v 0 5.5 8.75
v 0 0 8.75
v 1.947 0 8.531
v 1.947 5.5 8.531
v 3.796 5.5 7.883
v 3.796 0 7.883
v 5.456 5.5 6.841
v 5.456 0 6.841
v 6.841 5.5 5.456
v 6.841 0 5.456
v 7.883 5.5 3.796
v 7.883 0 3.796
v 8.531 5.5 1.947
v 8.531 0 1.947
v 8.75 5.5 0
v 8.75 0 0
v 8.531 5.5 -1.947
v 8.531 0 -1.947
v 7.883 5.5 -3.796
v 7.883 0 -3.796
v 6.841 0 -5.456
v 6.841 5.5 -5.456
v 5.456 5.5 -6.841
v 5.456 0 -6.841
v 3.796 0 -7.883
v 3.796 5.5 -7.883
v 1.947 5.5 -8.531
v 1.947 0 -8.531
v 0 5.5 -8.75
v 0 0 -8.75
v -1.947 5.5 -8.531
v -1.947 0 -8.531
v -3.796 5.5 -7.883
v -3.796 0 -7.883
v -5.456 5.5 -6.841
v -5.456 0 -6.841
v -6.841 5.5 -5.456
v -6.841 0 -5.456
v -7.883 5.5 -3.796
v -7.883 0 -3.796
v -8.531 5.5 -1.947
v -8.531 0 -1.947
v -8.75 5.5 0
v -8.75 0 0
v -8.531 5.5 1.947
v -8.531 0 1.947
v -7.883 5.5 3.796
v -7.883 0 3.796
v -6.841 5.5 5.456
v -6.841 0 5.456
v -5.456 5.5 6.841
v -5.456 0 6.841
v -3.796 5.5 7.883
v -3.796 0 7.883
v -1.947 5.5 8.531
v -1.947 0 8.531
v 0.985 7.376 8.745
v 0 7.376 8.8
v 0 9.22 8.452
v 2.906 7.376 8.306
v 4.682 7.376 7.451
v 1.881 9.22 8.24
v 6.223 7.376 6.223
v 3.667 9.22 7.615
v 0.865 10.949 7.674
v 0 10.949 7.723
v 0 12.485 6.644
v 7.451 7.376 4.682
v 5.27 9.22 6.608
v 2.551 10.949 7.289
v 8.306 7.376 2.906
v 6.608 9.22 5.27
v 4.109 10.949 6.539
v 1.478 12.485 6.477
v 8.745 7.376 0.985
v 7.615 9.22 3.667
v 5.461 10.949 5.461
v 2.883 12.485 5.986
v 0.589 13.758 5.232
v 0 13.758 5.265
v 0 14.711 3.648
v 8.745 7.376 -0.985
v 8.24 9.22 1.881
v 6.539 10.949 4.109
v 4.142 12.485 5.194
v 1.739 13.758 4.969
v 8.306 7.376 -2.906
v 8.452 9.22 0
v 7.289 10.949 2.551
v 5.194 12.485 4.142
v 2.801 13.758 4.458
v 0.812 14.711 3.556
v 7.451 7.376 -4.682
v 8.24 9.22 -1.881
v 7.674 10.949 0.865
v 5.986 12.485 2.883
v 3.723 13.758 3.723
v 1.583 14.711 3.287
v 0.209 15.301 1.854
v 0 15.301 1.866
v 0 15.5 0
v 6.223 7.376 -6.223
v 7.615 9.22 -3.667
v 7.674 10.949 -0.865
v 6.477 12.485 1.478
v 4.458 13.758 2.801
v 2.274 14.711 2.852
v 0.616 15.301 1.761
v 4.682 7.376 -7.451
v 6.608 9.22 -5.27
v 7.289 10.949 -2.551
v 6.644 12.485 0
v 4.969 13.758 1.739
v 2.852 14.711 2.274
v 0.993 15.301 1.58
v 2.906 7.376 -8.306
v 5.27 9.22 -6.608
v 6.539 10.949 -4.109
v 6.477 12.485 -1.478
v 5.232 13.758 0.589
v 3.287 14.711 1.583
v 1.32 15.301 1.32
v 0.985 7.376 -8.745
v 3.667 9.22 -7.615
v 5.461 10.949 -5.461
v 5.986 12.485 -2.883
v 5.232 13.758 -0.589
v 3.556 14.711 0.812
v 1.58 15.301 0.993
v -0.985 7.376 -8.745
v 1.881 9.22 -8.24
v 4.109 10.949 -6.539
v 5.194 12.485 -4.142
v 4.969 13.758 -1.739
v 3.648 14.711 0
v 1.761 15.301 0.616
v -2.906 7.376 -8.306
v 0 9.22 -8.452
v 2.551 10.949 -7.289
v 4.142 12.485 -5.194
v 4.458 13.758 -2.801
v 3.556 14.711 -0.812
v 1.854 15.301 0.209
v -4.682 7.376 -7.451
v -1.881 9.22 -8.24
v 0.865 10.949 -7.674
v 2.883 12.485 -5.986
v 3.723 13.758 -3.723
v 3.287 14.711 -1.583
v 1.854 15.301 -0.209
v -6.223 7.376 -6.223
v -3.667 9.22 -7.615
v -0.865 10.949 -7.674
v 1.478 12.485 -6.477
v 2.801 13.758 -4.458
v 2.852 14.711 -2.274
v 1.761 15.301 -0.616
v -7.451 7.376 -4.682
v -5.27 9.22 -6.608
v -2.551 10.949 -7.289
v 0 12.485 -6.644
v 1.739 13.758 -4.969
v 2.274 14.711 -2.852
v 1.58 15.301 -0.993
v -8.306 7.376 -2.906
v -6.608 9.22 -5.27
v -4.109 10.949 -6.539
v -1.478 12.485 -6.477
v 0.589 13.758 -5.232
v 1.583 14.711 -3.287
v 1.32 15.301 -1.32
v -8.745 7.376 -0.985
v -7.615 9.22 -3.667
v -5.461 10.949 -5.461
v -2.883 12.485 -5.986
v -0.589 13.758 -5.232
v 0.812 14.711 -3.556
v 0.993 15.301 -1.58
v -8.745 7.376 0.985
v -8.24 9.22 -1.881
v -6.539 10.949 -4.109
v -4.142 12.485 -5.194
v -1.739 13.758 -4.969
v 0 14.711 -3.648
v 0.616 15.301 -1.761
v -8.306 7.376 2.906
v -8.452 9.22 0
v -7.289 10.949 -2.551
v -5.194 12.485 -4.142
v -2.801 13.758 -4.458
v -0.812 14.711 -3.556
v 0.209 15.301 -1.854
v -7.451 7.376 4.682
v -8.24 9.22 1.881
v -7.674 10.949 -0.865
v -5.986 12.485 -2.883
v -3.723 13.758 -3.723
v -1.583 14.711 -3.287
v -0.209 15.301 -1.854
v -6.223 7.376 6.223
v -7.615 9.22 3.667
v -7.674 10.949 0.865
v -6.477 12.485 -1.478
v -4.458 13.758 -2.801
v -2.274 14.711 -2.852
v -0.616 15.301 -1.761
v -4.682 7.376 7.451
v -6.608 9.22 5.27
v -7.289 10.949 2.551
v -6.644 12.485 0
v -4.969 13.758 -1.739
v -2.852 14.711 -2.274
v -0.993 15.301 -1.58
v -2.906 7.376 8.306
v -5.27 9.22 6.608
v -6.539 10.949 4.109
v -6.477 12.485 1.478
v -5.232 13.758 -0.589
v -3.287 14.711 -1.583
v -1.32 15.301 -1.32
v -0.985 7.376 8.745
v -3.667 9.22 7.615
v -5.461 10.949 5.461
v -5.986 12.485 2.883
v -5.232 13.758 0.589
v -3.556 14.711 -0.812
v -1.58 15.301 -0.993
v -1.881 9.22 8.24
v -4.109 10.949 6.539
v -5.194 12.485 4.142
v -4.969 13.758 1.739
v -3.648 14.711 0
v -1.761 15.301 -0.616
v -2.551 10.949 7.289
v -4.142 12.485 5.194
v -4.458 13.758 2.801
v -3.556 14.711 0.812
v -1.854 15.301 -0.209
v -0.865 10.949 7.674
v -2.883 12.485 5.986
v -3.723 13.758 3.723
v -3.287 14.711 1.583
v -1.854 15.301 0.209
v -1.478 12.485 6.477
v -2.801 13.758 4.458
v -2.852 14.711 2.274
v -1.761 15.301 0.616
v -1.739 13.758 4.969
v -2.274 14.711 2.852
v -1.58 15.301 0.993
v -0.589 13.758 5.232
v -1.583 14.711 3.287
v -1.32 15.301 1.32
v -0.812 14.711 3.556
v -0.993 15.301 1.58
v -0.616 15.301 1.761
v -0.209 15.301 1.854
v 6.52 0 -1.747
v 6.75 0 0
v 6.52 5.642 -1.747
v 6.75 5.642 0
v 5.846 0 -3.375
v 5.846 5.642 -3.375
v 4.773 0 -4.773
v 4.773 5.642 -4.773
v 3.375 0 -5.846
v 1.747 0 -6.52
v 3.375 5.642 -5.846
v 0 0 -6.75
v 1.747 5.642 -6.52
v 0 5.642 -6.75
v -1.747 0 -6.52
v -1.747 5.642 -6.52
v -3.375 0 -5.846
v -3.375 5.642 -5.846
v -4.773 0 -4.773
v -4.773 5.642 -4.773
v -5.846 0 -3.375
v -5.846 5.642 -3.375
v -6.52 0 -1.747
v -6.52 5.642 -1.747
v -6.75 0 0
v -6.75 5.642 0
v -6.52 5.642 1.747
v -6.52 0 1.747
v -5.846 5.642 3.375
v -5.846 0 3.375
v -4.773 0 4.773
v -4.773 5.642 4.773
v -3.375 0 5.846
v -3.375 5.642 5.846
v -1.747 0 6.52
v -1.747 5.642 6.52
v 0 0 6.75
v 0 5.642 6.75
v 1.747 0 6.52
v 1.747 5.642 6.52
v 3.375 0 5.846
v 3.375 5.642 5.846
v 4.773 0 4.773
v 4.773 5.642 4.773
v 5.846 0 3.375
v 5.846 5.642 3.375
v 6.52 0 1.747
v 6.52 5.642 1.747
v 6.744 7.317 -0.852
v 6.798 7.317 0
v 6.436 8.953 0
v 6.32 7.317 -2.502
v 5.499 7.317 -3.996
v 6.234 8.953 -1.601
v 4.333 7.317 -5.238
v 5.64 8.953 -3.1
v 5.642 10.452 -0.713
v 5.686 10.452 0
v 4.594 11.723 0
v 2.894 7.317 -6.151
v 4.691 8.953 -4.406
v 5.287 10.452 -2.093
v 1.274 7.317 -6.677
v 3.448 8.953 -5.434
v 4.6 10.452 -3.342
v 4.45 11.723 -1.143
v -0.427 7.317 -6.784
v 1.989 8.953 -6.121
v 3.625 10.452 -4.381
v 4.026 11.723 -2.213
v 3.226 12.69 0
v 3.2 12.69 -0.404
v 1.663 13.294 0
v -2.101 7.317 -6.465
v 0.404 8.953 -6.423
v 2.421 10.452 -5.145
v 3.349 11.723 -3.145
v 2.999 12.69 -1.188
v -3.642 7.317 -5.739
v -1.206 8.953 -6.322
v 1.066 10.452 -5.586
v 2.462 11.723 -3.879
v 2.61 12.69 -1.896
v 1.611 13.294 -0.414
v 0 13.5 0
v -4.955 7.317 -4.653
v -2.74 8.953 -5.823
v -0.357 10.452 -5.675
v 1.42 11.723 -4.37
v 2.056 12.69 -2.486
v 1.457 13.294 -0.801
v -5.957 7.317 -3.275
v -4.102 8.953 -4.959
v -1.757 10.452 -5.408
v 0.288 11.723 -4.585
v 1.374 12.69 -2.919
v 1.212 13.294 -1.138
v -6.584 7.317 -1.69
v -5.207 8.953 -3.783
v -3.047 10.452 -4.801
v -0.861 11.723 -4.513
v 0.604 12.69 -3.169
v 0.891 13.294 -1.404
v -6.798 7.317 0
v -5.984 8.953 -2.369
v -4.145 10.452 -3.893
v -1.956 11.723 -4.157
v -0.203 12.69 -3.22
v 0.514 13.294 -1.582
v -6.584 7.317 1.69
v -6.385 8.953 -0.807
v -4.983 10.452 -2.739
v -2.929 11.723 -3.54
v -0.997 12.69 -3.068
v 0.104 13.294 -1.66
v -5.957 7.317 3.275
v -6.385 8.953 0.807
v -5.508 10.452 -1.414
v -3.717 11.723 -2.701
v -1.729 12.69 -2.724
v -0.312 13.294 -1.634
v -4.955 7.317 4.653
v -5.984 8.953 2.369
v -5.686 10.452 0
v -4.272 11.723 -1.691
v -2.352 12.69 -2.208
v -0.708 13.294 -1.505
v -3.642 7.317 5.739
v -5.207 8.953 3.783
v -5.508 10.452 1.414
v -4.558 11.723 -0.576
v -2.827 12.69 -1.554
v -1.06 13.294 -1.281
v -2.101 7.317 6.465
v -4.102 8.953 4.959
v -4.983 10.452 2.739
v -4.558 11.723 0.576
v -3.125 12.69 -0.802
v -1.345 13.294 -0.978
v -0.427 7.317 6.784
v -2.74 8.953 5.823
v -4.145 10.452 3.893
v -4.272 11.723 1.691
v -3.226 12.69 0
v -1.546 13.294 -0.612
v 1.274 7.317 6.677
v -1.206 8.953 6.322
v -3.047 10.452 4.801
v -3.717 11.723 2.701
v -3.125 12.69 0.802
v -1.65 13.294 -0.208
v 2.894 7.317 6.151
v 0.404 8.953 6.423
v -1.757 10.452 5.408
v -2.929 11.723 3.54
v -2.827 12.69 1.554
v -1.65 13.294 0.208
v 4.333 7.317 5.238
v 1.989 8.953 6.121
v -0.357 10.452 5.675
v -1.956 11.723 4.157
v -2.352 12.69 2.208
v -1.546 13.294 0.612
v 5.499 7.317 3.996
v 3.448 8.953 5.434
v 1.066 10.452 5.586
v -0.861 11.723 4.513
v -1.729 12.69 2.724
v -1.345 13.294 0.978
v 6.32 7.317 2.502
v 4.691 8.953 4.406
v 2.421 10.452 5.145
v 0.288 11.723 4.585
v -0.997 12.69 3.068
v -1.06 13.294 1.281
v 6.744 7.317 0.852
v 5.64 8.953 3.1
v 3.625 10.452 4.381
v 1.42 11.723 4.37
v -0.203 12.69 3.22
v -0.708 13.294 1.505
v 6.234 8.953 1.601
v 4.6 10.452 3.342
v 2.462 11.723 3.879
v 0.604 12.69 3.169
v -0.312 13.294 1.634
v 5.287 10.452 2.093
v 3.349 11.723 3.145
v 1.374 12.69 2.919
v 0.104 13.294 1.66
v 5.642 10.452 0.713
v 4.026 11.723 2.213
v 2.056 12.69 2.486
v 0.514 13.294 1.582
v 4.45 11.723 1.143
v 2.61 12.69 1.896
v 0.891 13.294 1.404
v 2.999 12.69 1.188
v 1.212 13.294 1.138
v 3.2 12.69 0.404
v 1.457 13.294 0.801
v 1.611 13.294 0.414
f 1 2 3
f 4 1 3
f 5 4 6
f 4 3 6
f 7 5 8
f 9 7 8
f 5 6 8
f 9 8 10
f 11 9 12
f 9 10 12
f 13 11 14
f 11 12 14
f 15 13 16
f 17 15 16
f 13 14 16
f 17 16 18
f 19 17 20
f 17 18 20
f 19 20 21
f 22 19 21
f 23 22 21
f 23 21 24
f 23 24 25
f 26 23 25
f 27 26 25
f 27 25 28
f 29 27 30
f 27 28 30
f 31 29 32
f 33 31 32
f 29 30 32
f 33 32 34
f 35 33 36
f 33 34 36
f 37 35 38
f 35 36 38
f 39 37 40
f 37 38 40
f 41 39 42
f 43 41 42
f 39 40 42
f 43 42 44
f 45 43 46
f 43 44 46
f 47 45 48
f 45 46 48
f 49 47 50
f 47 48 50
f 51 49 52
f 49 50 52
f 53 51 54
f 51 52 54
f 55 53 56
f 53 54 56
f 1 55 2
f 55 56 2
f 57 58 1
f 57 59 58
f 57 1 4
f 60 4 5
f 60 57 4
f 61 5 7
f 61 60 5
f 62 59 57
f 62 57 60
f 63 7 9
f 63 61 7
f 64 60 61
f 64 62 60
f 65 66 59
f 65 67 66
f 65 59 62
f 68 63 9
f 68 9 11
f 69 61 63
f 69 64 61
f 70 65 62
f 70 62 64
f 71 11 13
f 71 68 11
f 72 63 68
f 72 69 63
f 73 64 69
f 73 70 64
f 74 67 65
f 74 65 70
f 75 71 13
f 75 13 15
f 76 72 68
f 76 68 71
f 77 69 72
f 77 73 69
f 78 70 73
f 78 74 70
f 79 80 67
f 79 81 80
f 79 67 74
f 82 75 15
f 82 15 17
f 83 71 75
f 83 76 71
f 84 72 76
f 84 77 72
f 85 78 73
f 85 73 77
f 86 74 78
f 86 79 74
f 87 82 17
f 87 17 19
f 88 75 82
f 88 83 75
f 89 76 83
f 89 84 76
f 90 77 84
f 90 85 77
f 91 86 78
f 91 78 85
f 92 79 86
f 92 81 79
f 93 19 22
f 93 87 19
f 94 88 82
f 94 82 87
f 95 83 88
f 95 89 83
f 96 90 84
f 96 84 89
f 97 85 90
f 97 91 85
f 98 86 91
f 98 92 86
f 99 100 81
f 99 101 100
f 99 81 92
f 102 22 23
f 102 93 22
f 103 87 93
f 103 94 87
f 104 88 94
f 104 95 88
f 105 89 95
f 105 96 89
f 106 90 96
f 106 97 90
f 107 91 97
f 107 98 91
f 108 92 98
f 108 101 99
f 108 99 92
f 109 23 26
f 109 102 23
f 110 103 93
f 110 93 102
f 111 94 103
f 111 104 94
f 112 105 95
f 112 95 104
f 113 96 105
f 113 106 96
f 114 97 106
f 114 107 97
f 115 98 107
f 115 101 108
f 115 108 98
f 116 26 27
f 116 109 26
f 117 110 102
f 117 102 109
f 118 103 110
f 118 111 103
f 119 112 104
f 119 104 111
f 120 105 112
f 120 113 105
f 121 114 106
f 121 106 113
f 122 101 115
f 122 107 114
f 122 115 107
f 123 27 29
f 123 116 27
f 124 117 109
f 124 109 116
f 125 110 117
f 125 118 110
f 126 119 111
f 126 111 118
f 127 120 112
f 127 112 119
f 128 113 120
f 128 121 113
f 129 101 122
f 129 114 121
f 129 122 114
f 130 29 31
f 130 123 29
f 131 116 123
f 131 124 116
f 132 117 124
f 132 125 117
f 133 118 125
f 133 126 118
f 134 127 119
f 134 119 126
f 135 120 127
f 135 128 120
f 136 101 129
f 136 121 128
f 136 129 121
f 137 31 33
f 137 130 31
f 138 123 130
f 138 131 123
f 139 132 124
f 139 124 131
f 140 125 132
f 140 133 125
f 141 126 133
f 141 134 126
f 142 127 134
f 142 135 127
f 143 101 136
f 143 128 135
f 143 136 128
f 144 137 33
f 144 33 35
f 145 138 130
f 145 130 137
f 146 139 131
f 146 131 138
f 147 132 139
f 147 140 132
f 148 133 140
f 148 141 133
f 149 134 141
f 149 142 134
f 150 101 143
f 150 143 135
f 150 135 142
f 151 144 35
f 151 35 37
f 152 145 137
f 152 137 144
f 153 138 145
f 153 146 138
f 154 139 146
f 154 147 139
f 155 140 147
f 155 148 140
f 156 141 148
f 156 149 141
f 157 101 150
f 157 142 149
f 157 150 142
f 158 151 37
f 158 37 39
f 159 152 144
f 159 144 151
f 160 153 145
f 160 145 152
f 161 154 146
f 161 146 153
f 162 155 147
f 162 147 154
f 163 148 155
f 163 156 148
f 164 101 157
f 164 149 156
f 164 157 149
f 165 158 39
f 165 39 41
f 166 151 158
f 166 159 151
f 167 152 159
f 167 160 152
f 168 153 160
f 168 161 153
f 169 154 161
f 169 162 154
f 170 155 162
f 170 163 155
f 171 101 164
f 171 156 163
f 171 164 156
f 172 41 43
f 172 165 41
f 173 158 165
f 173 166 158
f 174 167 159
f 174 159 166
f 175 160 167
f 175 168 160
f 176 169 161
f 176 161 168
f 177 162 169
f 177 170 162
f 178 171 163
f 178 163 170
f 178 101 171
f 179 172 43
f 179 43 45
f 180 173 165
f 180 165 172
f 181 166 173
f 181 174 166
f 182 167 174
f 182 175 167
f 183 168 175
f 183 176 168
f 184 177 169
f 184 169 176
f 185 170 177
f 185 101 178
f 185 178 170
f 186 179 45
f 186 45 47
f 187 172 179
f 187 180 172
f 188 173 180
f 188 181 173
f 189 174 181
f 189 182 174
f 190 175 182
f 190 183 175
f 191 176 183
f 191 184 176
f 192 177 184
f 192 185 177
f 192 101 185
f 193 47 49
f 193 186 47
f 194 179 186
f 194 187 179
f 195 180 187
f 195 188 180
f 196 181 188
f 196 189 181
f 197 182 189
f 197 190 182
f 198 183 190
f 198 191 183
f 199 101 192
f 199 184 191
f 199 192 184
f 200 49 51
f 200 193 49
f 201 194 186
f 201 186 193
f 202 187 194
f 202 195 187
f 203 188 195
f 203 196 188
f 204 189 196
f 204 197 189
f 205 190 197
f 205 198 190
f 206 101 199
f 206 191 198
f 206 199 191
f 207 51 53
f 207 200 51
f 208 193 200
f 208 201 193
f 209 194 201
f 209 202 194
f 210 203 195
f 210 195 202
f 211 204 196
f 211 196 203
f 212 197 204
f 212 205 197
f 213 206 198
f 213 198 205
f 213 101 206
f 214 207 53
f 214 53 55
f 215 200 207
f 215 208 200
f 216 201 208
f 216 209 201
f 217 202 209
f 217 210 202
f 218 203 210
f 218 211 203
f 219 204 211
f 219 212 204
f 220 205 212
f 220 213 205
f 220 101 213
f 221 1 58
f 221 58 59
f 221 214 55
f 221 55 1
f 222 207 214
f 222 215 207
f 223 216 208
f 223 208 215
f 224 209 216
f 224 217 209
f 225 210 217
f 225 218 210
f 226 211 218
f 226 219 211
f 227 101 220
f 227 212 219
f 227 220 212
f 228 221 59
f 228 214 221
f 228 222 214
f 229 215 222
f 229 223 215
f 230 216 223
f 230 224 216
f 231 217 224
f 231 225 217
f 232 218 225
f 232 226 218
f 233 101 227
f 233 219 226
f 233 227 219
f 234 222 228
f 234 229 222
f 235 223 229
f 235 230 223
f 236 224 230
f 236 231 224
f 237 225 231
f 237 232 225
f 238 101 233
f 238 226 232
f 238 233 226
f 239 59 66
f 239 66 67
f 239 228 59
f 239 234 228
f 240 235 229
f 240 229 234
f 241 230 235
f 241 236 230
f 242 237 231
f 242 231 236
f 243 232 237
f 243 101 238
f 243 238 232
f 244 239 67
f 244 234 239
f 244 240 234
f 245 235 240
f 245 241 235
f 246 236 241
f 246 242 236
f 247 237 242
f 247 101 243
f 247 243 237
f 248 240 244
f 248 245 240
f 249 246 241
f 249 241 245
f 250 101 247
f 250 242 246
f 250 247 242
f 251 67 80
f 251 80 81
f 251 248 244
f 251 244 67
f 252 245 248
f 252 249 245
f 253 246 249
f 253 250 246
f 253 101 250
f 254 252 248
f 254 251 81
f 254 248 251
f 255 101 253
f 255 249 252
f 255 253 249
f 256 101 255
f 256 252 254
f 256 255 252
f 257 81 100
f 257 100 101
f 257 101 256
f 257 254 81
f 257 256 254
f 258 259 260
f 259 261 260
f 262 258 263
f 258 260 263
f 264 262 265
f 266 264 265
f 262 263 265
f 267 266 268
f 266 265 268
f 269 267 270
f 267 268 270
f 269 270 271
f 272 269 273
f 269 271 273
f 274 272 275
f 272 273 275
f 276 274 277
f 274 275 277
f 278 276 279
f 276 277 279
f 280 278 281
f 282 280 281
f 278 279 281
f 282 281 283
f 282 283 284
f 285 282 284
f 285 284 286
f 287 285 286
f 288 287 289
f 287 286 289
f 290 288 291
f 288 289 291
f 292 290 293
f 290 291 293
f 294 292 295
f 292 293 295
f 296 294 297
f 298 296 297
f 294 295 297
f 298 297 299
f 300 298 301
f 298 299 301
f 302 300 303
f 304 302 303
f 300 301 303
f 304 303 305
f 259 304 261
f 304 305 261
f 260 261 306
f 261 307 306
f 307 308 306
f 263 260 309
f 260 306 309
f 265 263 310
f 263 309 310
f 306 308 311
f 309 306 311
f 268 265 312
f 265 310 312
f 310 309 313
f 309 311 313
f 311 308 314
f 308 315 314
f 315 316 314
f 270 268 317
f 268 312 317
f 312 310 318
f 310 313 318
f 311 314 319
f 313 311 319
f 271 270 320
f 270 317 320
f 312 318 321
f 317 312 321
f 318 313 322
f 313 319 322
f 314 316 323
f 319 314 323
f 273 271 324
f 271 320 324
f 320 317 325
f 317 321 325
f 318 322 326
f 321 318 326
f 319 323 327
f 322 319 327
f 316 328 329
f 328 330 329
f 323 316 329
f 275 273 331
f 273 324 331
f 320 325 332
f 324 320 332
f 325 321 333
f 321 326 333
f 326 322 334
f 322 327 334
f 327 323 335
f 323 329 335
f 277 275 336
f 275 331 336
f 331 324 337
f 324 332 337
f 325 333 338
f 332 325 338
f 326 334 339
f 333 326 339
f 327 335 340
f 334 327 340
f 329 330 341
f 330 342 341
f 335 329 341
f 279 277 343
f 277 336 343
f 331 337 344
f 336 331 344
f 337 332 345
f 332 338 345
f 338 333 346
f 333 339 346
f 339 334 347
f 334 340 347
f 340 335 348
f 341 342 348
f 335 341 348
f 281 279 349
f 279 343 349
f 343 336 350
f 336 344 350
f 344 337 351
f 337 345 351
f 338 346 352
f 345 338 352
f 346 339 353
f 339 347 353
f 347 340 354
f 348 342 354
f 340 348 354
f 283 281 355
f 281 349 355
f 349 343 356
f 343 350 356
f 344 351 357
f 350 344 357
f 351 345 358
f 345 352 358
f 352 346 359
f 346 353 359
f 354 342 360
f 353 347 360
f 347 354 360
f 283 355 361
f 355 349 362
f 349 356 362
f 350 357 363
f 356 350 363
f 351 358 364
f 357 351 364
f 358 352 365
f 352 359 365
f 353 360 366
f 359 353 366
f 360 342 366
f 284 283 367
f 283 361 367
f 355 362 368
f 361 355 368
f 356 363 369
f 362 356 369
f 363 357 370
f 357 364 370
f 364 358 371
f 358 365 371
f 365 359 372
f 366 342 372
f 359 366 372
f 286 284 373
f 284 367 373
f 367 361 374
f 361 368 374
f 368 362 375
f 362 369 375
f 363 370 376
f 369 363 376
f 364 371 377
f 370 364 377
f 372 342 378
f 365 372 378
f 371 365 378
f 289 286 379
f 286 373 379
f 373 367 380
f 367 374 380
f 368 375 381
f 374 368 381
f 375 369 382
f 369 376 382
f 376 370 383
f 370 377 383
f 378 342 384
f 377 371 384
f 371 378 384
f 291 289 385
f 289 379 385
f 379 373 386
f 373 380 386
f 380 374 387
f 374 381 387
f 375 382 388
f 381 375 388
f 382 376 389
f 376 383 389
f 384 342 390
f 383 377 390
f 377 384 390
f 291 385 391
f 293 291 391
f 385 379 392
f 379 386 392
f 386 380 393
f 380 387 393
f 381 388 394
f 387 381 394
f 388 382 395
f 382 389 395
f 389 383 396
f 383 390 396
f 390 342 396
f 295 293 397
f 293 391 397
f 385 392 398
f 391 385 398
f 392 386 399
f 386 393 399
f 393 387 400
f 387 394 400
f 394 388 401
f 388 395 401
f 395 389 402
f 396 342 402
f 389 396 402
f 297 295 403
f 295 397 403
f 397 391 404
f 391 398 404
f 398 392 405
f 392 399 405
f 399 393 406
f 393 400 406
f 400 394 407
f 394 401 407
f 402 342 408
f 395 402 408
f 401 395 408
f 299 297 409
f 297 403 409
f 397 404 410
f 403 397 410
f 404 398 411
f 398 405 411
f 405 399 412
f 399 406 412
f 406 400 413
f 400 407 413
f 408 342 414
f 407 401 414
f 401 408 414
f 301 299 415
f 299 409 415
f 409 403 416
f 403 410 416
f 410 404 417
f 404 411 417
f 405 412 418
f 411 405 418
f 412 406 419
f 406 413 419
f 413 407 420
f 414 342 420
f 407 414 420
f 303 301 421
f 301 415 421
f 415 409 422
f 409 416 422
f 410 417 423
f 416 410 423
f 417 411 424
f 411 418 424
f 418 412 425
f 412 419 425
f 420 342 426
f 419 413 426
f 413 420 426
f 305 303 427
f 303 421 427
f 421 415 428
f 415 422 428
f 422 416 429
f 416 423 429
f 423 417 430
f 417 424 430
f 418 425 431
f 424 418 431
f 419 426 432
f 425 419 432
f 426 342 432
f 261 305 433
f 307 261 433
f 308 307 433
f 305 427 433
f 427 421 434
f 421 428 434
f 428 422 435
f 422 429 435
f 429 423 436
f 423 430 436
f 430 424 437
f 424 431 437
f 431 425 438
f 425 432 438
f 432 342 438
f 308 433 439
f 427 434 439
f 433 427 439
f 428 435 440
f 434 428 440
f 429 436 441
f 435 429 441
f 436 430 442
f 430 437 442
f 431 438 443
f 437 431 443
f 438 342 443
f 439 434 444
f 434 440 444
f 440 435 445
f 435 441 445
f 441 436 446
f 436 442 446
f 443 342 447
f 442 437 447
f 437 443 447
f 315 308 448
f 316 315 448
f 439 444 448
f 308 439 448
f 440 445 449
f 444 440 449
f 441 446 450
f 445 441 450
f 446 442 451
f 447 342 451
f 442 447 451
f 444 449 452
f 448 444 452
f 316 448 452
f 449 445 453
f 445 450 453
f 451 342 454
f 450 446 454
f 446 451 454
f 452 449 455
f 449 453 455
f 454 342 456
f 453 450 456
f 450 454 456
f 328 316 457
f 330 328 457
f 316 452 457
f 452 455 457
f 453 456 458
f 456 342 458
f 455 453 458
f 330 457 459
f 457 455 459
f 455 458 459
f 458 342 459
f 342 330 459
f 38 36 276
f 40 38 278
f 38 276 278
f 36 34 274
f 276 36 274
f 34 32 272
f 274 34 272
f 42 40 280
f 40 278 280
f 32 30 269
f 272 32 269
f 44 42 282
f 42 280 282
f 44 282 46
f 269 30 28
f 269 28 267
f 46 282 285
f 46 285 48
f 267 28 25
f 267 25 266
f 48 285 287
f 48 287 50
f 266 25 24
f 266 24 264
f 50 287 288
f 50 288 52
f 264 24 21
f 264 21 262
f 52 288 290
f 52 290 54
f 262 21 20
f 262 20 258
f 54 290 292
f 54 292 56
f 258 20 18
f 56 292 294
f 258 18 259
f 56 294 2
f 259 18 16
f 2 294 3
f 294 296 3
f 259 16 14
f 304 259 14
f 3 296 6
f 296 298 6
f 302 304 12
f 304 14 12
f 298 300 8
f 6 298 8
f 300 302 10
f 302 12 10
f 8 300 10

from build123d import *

# Parameters (mm, degrees)
SKETCH_1_R         = 8.75
EXTRUDE_1_DEPTH    = 5.5
DOME_1_FACE_RADIUS = 8.75
DOME_1_HEIGHT      = 10


# Read off the part's stored shape, not the designer's step: 抽壳1
with BuildPart() as part:
    # 草图1 → 凸台-拉伸1 (new body)
    with BuildSketch(Plane(origin=(0, 0, 0), x_dir=(1, 0, 0), z_dir=(0, 1, 0))):
        with Locations(Location((0, 0, 0), (0, 0, 270))):
            Circle(SKETCH_1_R)
    extrude(amount=EXTRUDE_1_DEPTH)

    # 圆顶1: a dome of height H over a round flat face of radius A is a cap of a sphere of radius (A * A + H * H) / (2 * H)
    dome_1_r = (DOME_1_FACE_RADIUS * DOME_1_FACE_RADIUS + DOME_1_HEIGHT * DOME_1_HEIGHT) / (2 * DOME_1_HEIGHT)
    dome_1_base = Plane((0, 5.5, 0), z_dir=(0, 1, 0))
    with Locations(dome_1_base.offset(DOME_1_HEIGHT - dome_1_r)):
        dome_1_ball = Sphere(dome_1_r, mode=Mode.PRIVATE)
    add(split(dome_1_ball, bisect_by=dome_1_base, keep=Keep.TOP, mode=Mode.PRIVATE))

    # 抽壳1 outline → 抽壳1 (revolve, cut)
    with BuildSketch(Plane.XY):
        with BuildLine():
            Line((0, 13.5), (0, 0))
            Line((0, 0), (6.75, 0))
            Line((6.75, 0), (6.75, 5.641927904))
            ThreePointArc((6.75, 5.641927904), (5.179570375, 11.12107063), (0, 13.5))
        make_face()
    revolve(axis=Axis((0, 0, 0), (0, 1, 0)), mode=Mode.SUBTRACT)


solid = part.part
